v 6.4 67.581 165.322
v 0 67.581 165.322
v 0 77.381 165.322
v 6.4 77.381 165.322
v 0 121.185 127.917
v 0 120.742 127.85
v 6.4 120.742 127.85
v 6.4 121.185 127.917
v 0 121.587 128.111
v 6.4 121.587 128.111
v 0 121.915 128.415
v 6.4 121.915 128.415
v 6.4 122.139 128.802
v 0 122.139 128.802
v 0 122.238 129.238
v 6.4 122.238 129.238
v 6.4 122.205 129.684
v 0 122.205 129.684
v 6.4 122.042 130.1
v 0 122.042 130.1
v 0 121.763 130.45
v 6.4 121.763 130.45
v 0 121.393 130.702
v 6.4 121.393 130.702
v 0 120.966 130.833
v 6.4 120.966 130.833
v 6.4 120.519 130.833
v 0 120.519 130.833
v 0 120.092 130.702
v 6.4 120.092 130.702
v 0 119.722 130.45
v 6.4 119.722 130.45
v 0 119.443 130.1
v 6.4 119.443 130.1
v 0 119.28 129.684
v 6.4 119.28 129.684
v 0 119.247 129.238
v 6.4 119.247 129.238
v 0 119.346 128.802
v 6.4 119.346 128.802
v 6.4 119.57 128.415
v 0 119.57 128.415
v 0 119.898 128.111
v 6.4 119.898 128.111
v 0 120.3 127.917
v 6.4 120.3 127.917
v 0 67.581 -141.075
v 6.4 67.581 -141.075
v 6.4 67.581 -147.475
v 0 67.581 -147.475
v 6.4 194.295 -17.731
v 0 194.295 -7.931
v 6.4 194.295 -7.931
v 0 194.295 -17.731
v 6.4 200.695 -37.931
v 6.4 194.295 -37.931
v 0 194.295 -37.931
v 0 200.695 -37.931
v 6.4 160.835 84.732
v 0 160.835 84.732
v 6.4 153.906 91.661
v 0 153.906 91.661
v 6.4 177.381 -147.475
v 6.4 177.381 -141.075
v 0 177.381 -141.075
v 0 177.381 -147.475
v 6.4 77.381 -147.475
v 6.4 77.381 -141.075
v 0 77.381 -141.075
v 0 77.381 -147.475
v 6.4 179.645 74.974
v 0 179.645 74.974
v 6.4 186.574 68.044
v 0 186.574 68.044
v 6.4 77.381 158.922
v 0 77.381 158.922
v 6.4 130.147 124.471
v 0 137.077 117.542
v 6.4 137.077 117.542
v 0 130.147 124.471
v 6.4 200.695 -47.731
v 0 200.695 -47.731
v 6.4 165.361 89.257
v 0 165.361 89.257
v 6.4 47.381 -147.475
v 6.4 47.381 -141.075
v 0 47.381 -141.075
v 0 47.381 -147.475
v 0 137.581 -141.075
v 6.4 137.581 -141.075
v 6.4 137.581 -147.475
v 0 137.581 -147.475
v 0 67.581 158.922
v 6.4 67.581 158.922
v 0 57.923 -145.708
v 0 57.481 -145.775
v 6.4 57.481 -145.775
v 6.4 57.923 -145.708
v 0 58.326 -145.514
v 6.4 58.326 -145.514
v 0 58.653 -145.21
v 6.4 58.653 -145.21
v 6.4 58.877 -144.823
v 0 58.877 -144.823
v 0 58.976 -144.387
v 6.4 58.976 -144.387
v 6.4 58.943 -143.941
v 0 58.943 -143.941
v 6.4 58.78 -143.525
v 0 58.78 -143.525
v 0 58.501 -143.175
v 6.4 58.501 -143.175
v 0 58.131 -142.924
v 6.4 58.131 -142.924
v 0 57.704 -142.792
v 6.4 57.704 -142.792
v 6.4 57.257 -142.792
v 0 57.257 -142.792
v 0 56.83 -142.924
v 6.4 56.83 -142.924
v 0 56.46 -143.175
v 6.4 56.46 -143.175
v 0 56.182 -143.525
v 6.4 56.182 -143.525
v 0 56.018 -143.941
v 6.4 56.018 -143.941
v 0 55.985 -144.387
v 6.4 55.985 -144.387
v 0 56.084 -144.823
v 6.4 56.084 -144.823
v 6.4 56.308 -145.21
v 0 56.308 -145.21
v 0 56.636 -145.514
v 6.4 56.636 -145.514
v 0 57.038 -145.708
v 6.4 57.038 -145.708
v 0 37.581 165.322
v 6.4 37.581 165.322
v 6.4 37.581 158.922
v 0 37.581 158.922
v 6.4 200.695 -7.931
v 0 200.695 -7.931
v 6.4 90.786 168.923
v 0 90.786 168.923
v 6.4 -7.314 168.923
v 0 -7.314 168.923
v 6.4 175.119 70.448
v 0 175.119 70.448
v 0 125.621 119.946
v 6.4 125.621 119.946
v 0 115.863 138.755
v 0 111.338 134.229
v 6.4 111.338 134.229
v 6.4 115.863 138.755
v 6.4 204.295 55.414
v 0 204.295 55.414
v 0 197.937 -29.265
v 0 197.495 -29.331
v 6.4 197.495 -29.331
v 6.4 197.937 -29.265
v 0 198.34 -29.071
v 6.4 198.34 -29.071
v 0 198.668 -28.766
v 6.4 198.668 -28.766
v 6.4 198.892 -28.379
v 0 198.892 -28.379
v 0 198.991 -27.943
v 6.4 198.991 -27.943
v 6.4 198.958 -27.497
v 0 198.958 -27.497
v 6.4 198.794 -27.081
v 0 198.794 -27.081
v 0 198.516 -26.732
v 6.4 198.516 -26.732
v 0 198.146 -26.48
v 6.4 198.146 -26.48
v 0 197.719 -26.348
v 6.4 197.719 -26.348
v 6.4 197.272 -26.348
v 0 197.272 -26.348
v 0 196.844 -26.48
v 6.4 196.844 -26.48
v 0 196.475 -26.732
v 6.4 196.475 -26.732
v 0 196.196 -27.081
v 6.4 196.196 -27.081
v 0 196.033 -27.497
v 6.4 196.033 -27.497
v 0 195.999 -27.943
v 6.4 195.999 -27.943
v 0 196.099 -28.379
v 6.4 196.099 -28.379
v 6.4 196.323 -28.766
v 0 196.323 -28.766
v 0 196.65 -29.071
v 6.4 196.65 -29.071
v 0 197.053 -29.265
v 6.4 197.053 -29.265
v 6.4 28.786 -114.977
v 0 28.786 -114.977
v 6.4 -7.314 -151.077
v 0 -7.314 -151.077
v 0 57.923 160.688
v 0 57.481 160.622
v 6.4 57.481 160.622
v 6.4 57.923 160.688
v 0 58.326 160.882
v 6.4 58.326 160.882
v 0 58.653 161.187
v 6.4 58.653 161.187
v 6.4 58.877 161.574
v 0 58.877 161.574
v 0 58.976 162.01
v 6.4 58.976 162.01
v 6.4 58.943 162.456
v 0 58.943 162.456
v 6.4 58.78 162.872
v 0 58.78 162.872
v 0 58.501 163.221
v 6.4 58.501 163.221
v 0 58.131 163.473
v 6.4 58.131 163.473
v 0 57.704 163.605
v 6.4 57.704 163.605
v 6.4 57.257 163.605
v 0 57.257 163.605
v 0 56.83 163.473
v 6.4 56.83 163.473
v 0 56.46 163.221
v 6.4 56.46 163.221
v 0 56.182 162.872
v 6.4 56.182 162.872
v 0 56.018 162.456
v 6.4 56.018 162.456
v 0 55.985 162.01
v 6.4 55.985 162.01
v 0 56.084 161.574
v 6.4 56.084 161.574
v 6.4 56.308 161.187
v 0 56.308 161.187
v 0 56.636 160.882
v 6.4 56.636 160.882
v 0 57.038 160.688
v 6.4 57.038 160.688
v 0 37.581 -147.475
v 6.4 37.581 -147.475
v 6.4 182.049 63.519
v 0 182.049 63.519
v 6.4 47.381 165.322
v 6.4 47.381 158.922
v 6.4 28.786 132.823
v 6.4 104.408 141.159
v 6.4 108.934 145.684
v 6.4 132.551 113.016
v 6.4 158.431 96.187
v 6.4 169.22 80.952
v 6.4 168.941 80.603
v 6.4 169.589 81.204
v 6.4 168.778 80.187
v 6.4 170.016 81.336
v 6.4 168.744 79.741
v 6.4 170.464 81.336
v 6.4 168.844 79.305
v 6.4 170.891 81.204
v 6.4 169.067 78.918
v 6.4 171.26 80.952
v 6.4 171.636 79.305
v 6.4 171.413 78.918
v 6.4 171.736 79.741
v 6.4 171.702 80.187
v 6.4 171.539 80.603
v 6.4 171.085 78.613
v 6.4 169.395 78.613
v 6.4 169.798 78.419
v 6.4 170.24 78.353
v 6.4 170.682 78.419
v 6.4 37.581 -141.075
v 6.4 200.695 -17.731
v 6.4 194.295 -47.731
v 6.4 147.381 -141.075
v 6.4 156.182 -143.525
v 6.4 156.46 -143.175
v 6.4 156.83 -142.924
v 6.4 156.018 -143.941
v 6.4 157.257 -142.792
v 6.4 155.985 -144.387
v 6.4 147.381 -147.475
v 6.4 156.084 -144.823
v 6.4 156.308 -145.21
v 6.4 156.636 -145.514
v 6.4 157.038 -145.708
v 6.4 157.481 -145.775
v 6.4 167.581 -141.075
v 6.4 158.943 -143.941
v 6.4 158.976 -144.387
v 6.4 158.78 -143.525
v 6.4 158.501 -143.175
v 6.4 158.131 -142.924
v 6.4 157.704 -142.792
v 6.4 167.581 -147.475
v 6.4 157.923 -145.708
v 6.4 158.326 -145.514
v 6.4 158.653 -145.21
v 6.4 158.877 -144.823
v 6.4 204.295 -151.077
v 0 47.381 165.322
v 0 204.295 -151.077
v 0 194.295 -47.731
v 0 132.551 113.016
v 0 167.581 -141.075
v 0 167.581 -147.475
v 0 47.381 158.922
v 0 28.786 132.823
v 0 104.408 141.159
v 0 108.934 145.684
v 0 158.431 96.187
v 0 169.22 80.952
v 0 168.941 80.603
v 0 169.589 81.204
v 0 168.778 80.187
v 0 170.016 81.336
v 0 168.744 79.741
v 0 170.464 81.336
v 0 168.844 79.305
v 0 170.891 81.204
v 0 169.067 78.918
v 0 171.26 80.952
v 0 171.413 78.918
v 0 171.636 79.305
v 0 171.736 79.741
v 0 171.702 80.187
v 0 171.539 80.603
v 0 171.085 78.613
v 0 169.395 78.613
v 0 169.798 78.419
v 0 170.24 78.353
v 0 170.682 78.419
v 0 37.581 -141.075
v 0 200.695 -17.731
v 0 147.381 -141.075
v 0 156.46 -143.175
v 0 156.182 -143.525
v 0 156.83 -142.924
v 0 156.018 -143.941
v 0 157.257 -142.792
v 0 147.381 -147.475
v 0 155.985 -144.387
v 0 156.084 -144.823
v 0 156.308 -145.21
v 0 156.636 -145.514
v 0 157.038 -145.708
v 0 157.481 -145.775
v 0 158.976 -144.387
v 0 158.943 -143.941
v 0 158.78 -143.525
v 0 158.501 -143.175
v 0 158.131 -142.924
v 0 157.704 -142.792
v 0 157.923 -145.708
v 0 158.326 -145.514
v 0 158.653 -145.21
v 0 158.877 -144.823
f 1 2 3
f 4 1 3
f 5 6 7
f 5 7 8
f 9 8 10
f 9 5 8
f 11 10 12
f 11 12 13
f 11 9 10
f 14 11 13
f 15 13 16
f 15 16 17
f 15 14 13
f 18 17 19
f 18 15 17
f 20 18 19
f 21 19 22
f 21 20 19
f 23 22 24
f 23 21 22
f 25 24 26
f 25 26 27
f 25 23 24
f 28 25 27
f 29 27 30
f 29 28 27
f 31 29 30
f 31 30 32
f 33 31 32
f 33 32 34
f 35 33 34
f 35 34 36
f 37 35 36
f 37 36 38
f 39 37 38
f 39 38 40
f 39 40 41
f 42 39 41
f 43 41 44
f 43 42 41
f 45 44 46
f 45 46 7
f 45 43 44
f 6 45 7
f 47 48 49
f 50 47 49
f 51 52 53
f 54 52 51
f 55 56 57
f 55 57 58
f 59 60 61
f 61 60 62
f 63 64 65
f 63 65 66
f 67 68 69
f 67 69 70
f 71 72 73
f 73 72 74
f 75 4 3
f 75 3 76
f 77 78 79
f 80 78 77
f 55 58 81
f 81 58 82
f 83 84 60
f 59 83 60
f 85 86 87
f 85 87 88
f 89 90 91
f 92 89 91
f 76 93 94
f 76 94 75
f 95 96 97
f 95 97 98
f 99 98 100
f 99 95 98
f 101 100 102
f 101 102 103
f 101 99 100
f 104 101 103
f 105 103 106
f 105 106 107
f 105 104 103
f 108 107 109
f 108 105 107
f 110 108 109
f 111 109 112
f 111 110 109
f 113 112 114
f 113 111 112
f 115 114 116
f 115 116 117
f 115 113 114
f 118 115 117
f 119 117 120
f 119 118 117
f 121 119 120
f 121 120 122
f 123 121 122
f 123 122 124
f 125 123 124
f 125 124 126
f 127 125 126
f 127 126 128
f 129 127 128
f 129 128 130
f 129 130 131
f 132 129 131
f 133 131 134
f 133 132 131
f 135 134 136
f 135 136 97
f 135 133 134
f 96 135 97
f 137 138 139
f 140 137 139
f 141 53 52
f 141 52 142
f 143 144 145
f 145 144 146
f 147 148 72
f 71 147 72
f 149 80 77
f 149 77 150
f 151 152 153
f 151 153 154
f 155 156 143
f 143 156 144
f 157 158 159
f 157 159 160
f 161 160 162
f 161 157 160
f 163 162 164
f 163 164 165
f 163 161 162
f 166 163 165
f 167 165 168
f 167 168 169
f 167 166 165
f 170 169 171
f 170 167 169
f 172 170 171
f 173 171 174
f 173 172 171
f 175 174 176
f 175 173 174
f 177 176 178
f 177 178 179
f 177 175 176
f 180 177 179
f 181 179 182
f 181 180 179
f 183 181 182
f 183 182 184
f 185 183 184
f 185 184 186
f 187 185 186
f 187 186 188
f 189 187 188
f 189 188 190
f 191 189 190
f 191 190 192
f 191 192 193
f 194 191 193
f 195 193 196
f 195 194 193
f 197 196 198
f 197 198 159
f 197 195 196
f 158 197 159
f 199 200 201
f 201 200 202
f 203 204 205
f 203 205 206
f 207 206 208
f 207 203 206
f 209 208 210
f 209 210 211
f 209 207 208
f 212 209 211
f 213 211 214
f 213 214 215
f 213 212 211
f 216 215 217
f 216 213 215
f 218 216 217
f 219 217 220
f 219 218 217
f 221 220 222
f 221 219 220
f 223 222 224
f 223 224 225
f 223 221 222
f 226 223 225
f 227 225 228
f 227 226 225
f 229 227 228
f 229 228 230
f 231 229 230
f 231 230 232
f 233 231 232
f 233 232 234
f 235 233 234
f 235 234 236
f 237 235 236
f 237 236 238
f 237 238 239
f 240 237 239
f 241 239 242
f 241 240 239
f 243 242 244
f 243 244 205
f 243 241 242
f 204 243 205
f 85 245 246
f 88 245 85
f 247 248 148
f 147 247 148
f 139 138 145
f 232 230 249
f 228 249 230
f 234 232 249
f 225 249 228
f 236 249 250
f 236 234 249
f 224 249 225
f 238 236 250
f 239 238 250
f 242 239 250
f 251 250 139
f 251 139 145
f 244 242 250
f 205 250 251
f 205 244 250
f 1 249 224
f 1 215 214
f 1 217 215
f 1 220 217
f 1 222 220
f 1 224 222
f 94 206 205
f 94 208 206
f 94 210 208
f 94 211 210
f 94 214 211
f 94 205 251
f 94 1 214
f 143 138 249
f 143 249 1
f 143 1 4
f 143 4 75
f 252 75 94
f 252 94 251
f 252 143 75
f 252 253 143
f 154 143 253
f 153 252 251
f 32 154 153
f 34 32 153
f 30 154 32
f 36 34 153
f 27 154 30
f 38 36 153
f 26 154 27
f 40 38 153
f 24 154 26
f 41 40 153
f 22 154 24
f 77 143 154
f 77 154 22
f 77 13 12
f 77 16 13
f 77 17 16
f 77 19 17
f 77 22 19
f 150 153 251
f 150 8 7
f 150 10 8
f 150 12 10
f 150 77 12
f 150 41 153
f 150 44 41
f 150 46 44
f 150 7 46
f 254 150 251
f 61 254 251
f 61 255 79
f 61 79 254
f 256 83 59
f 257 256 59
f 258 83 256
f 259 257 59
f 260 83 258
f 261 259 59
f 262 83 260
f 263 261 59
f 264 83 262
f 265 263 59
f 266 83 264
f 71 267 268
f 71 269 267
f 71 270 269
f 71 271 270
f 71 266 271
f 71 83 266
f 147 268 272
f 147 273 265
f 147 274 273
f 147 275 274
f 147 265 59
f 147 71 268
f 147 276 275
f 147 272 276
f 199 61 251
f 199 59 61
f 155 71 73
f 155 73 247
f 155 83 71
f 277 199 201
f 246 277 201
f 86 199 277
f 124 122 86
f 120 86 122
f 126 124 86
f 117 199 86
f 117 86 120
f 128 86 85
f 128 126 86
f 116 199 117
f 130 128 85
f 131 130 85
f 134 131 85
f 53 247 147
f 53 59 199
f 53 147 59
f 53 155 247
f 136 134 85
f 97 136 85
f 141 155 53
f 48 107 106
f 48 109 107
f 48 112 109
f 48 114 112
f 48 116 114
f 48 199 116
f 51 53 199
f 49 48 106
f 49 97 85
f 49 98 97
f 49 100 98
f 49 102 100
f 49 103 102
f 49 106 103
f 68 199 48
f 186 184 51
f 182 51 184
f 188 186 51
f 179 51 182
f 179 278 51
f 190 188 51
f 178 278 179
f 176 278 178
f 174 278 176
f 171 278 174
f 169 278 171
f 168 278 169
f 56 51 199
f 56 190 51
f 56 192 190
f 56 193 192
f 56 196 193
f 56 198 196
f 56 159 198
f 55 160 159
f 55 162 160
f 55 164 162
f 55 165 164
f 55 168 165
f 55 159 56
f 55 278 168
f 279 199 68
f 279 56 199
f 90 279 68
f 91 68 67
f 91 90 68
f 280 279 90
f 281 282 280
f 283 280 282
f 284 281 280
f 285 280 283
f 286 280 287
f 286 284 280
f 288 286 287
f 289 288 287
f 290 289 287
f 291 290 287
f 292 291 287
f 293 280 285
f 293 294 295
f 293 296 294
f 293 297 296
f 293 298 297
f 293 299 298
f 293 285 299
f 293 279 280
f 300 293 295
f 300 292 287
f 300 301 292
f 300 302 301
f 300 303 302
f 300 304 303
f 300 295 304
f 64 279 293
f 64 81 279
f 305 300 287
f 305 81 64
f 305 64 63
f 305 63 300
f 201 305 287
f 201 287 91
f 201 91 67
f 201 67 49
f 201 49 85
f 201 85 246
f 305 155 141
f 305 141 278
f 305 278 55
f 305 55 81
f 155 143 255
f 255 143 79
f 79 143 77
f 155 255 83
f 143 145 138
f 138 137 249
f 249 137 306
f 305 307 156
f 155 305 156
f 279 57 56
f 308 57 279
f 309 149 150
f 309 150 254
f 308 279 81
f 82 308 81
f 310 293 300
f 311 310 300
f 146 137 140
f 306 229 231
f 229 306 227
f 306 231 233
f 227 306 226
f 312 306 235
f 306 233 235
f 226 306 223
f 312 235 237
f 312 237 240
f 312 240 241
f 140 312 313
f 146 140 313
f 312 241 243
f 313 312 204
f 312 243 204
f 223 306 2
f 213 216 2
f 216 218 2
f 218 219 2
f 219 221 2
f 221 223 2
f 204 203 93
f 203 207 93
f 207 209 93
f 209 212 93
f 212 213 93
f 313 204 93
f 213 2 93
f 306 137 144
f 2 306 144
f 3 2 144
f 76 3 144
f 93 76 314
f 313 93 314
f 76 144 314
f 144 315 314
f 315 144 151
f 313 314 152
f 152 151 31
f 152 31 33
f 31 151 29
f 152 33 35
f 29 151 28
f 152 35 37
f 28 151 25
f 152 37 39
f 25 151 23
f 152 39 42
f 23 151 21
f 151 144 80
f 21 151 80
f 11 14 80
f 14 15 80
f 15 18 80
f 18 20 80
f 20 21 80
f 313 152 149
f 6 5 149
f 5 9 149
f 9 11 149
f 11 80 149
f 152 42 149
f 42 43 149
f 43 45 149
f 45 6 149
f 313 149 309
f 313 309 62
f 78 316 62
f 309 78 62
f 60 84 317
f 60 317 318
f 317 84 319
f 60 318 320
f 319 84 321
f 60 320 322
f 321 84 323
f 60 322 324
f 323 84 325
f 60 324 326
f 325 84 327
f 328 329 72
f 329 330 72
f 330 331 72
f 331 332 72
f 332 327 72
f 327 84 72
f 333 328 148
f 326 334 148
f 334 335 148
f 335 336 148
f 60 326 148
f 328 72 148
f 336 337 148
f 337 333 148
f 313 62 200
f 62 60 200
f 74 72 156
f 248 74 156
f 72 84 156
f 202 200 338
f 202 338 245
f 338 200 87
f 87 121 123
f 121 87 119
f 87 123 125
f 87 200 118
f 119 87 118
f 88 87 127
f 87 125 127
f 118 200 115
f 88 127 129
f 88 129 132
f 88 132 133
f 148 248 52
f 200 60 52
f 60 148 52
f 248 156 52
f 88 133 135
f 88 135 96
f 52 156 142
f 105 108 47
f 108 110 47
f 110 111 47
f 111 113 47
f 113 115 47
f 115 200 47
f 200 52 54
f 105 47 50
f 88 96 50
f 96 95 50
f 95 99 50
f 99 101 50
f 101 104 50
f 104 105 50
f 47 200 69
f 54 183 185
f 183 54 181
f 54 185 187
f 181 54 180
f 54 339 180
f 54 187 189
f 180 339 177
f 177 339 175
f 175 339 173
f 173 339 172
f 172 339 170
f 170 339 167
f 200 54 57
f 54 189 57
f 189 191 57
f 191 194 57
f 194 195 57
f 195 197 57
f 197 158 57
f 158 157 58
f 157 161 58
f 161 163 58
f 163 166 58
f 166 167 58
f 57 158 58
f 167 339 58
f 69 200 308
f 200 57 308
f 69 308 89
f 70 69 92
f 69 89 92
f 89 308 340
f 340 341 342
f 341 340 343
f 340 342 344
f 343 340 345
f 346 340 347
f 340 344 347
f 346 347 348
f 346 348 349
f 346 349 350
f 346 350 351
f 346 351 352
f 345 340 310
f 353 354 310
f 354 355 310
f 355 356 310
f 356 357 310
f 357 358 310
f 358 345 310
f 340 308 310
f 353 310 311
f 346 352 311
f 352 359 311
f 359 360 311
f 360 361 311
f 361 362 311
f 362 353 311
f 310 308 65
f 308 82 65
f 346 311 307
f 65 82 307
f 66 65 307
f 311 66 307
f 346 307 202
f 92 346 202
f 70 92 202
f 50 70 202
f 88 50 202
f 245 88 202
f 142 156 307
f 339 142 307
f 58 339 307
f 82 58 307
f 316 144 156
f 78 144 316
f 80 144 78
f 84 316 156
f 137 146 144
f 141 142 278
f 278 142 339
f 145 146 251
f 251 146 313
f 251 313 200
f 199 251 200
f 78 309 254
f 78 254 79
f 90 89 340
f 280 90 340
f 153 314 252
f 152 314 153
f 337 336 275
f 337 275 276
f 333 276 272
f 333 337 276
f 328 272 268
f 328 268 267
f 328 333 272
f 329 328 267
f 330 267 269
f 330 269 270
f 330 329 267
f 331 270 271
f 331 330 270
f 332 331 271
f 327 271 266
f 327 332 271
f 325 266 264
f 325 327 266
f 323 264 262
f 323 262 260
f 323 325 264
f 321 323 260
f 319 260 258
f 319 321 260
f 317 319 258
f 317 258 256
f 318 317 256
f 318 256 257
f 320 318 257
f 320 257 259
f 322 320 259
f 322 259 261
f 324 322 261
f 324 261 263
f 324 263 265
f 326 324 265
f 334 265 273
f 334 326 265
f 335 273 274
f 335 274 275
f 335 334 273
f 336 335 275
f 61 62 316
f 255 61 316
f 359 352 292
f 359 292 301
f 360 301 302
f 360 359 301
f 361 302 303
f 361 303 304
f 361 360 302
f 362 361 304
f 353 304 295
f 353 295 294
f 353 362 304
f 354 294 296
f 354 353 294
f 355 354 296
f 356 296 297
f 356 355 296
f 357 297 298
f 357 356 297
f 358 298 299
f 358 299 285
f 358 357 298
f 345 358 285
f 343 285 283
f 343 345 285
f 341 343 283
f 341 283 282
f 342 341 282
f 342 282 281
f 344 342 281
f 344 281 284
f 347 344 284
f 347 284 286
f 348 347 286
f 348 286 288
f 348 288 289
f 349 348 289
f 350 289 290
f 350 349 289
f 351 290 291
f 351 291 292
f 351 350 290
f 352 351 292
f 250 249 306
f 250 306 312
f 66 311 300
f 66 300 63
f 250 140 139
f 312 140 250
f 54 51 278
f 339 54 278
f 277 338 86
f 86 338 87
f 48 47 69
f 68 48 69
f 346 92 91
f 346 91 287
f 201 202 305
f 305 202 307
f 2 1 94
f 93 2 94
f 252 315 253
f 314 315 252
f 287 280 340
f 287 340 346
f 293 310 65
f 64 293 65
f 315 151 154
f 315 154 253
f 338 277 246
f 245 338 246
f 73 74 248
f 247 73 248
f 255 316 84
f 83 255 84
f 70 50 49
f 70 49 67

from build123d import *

# Parameters (mm, degrees)
SKETCH1_R           = 1.5
SKETCH1_W           = 6.4
SKETCH1_H           = 9.8
SKETCH1_W_2         = 9.8
SKETCH1_H_2         = 6.4
BOSS_EXTRUDE1_DEPTH = 6.4


with BuildPart() as part:
    # Sketch1 → Boss-Extrude1 (new body)
    with BuildSketch(Plane(origin=(0, 0, 0), x_dir=(0, 0, -1), z_dir=(1, 0, 0))):
        Polygon((-132.823391234, 28.785955079), (114.976608766, 28.785955079), (151.076608766, -7.314044921), (151.076608766, 204.295266909), (-55.414079404, 204.295266909), (-168.923391234, 90.785955079), (-168.923391234, -7.314044921), align=None)
        with Locations((144.275039161, 57.480587849)):
            Circle(SKETCH1_R, mode=Mode.SUBTRACT)
        with Locations((144.275039161, 157.480587849)):
            Circle(SKETCH1_R, mode=Mode.SUBTRACT)
        with Locations((27.831264681, 197.495266909)):
            Circle(SKETCH1_R, mode=Mode.SUBTRACT)
        with Locations((-79.85274236, 170.239957095)):
            Circle(SKETCH1_R, mode=Mode.SUBTRACT)
        with Locations((-129.350217044, 120.742482412)):
            Circle(SKETCH1_R, mode=Mode.SUBTRACT)
        with Locations((-162.121821629, 57.480587849)):
            Circle(SKETCH1_R, mode=Mode.SUBTRACT)
        with Locations((144.275039161, 142.480587849)):
            Rectangle(SKETCH1_W, SKETCH1_H, mode=Mode.SUBTRACT)
        with Locations((144.275039161, 172.480587849)):
            Rectangle(SKETCH1_W, SKETCH1_H, mode=Mode.SUBTRACT)
        with Locations((144.275039161, 72.480587849)):
            Rectangle(SKETCH1_W, SKETCH1_H, mode=Mode.SUBTRACT)
        with Locations((144.275039161, 42.480587849)):
            Rectangle(SKETCH1_W, SKETCH1_H, mode=Mode.SUBTRACT)
        with Locations((42.831264681, 197.495266909)):
            Rectangle(SKETCH1_W_2, SKETCH1_H_2, mode=Mode.SUBTRACT)
        with Locations((12.831264681, 197.495266909)):
            Rectangle(SKETCH1_W_2, SKETCH1_H_2, mode=Mode.SUBTRACT)
        Polygon((-68.044023742, 186.574153746), (-63.518540343, 182.048670346), (-70.448186798, 175.119023891), (-74.973670198, 179.64450729), align=None, mode=Mode.SUBTRACT)
        Polygon((-96.186873634, 158.431303855), (-89.257227178, 165.36095031), (-84.731743778, 160.835466911), (-91.661390234, 153.905820455), align=None, mode=Mode.SUBTRACT)
        Polygon((-113.016080404, 132.551130285), (-117.541563803, 137.076613685), (-124.471210259, 130.146967229), (-119.945726859, 125.62148383), align=None, mode=Mode.SUBTRACT)
        Polygon((-138.754767239, 115.863410249), (-145.684413695, 108.933763794), (-141.158930295, 104.408280394), (-134.229283839, 111.33792685), align=None, mode=Mode.SUBTRACT)
        with Locations((-162.121821629, 42.480587849)):
            Rectangle(SKETCH1_W, SKETCH1_H, mode=Mode.SUBTRACT)
        with Locations((-162.121821629, 72.480587849)):
            Rectangle(SKETCH1_W, SKETCH1_H, mode=Mode.SUBTRACT)
    extrude(amount=BOSS_EXTRUDE1_DEPTH)


solid = part.part
